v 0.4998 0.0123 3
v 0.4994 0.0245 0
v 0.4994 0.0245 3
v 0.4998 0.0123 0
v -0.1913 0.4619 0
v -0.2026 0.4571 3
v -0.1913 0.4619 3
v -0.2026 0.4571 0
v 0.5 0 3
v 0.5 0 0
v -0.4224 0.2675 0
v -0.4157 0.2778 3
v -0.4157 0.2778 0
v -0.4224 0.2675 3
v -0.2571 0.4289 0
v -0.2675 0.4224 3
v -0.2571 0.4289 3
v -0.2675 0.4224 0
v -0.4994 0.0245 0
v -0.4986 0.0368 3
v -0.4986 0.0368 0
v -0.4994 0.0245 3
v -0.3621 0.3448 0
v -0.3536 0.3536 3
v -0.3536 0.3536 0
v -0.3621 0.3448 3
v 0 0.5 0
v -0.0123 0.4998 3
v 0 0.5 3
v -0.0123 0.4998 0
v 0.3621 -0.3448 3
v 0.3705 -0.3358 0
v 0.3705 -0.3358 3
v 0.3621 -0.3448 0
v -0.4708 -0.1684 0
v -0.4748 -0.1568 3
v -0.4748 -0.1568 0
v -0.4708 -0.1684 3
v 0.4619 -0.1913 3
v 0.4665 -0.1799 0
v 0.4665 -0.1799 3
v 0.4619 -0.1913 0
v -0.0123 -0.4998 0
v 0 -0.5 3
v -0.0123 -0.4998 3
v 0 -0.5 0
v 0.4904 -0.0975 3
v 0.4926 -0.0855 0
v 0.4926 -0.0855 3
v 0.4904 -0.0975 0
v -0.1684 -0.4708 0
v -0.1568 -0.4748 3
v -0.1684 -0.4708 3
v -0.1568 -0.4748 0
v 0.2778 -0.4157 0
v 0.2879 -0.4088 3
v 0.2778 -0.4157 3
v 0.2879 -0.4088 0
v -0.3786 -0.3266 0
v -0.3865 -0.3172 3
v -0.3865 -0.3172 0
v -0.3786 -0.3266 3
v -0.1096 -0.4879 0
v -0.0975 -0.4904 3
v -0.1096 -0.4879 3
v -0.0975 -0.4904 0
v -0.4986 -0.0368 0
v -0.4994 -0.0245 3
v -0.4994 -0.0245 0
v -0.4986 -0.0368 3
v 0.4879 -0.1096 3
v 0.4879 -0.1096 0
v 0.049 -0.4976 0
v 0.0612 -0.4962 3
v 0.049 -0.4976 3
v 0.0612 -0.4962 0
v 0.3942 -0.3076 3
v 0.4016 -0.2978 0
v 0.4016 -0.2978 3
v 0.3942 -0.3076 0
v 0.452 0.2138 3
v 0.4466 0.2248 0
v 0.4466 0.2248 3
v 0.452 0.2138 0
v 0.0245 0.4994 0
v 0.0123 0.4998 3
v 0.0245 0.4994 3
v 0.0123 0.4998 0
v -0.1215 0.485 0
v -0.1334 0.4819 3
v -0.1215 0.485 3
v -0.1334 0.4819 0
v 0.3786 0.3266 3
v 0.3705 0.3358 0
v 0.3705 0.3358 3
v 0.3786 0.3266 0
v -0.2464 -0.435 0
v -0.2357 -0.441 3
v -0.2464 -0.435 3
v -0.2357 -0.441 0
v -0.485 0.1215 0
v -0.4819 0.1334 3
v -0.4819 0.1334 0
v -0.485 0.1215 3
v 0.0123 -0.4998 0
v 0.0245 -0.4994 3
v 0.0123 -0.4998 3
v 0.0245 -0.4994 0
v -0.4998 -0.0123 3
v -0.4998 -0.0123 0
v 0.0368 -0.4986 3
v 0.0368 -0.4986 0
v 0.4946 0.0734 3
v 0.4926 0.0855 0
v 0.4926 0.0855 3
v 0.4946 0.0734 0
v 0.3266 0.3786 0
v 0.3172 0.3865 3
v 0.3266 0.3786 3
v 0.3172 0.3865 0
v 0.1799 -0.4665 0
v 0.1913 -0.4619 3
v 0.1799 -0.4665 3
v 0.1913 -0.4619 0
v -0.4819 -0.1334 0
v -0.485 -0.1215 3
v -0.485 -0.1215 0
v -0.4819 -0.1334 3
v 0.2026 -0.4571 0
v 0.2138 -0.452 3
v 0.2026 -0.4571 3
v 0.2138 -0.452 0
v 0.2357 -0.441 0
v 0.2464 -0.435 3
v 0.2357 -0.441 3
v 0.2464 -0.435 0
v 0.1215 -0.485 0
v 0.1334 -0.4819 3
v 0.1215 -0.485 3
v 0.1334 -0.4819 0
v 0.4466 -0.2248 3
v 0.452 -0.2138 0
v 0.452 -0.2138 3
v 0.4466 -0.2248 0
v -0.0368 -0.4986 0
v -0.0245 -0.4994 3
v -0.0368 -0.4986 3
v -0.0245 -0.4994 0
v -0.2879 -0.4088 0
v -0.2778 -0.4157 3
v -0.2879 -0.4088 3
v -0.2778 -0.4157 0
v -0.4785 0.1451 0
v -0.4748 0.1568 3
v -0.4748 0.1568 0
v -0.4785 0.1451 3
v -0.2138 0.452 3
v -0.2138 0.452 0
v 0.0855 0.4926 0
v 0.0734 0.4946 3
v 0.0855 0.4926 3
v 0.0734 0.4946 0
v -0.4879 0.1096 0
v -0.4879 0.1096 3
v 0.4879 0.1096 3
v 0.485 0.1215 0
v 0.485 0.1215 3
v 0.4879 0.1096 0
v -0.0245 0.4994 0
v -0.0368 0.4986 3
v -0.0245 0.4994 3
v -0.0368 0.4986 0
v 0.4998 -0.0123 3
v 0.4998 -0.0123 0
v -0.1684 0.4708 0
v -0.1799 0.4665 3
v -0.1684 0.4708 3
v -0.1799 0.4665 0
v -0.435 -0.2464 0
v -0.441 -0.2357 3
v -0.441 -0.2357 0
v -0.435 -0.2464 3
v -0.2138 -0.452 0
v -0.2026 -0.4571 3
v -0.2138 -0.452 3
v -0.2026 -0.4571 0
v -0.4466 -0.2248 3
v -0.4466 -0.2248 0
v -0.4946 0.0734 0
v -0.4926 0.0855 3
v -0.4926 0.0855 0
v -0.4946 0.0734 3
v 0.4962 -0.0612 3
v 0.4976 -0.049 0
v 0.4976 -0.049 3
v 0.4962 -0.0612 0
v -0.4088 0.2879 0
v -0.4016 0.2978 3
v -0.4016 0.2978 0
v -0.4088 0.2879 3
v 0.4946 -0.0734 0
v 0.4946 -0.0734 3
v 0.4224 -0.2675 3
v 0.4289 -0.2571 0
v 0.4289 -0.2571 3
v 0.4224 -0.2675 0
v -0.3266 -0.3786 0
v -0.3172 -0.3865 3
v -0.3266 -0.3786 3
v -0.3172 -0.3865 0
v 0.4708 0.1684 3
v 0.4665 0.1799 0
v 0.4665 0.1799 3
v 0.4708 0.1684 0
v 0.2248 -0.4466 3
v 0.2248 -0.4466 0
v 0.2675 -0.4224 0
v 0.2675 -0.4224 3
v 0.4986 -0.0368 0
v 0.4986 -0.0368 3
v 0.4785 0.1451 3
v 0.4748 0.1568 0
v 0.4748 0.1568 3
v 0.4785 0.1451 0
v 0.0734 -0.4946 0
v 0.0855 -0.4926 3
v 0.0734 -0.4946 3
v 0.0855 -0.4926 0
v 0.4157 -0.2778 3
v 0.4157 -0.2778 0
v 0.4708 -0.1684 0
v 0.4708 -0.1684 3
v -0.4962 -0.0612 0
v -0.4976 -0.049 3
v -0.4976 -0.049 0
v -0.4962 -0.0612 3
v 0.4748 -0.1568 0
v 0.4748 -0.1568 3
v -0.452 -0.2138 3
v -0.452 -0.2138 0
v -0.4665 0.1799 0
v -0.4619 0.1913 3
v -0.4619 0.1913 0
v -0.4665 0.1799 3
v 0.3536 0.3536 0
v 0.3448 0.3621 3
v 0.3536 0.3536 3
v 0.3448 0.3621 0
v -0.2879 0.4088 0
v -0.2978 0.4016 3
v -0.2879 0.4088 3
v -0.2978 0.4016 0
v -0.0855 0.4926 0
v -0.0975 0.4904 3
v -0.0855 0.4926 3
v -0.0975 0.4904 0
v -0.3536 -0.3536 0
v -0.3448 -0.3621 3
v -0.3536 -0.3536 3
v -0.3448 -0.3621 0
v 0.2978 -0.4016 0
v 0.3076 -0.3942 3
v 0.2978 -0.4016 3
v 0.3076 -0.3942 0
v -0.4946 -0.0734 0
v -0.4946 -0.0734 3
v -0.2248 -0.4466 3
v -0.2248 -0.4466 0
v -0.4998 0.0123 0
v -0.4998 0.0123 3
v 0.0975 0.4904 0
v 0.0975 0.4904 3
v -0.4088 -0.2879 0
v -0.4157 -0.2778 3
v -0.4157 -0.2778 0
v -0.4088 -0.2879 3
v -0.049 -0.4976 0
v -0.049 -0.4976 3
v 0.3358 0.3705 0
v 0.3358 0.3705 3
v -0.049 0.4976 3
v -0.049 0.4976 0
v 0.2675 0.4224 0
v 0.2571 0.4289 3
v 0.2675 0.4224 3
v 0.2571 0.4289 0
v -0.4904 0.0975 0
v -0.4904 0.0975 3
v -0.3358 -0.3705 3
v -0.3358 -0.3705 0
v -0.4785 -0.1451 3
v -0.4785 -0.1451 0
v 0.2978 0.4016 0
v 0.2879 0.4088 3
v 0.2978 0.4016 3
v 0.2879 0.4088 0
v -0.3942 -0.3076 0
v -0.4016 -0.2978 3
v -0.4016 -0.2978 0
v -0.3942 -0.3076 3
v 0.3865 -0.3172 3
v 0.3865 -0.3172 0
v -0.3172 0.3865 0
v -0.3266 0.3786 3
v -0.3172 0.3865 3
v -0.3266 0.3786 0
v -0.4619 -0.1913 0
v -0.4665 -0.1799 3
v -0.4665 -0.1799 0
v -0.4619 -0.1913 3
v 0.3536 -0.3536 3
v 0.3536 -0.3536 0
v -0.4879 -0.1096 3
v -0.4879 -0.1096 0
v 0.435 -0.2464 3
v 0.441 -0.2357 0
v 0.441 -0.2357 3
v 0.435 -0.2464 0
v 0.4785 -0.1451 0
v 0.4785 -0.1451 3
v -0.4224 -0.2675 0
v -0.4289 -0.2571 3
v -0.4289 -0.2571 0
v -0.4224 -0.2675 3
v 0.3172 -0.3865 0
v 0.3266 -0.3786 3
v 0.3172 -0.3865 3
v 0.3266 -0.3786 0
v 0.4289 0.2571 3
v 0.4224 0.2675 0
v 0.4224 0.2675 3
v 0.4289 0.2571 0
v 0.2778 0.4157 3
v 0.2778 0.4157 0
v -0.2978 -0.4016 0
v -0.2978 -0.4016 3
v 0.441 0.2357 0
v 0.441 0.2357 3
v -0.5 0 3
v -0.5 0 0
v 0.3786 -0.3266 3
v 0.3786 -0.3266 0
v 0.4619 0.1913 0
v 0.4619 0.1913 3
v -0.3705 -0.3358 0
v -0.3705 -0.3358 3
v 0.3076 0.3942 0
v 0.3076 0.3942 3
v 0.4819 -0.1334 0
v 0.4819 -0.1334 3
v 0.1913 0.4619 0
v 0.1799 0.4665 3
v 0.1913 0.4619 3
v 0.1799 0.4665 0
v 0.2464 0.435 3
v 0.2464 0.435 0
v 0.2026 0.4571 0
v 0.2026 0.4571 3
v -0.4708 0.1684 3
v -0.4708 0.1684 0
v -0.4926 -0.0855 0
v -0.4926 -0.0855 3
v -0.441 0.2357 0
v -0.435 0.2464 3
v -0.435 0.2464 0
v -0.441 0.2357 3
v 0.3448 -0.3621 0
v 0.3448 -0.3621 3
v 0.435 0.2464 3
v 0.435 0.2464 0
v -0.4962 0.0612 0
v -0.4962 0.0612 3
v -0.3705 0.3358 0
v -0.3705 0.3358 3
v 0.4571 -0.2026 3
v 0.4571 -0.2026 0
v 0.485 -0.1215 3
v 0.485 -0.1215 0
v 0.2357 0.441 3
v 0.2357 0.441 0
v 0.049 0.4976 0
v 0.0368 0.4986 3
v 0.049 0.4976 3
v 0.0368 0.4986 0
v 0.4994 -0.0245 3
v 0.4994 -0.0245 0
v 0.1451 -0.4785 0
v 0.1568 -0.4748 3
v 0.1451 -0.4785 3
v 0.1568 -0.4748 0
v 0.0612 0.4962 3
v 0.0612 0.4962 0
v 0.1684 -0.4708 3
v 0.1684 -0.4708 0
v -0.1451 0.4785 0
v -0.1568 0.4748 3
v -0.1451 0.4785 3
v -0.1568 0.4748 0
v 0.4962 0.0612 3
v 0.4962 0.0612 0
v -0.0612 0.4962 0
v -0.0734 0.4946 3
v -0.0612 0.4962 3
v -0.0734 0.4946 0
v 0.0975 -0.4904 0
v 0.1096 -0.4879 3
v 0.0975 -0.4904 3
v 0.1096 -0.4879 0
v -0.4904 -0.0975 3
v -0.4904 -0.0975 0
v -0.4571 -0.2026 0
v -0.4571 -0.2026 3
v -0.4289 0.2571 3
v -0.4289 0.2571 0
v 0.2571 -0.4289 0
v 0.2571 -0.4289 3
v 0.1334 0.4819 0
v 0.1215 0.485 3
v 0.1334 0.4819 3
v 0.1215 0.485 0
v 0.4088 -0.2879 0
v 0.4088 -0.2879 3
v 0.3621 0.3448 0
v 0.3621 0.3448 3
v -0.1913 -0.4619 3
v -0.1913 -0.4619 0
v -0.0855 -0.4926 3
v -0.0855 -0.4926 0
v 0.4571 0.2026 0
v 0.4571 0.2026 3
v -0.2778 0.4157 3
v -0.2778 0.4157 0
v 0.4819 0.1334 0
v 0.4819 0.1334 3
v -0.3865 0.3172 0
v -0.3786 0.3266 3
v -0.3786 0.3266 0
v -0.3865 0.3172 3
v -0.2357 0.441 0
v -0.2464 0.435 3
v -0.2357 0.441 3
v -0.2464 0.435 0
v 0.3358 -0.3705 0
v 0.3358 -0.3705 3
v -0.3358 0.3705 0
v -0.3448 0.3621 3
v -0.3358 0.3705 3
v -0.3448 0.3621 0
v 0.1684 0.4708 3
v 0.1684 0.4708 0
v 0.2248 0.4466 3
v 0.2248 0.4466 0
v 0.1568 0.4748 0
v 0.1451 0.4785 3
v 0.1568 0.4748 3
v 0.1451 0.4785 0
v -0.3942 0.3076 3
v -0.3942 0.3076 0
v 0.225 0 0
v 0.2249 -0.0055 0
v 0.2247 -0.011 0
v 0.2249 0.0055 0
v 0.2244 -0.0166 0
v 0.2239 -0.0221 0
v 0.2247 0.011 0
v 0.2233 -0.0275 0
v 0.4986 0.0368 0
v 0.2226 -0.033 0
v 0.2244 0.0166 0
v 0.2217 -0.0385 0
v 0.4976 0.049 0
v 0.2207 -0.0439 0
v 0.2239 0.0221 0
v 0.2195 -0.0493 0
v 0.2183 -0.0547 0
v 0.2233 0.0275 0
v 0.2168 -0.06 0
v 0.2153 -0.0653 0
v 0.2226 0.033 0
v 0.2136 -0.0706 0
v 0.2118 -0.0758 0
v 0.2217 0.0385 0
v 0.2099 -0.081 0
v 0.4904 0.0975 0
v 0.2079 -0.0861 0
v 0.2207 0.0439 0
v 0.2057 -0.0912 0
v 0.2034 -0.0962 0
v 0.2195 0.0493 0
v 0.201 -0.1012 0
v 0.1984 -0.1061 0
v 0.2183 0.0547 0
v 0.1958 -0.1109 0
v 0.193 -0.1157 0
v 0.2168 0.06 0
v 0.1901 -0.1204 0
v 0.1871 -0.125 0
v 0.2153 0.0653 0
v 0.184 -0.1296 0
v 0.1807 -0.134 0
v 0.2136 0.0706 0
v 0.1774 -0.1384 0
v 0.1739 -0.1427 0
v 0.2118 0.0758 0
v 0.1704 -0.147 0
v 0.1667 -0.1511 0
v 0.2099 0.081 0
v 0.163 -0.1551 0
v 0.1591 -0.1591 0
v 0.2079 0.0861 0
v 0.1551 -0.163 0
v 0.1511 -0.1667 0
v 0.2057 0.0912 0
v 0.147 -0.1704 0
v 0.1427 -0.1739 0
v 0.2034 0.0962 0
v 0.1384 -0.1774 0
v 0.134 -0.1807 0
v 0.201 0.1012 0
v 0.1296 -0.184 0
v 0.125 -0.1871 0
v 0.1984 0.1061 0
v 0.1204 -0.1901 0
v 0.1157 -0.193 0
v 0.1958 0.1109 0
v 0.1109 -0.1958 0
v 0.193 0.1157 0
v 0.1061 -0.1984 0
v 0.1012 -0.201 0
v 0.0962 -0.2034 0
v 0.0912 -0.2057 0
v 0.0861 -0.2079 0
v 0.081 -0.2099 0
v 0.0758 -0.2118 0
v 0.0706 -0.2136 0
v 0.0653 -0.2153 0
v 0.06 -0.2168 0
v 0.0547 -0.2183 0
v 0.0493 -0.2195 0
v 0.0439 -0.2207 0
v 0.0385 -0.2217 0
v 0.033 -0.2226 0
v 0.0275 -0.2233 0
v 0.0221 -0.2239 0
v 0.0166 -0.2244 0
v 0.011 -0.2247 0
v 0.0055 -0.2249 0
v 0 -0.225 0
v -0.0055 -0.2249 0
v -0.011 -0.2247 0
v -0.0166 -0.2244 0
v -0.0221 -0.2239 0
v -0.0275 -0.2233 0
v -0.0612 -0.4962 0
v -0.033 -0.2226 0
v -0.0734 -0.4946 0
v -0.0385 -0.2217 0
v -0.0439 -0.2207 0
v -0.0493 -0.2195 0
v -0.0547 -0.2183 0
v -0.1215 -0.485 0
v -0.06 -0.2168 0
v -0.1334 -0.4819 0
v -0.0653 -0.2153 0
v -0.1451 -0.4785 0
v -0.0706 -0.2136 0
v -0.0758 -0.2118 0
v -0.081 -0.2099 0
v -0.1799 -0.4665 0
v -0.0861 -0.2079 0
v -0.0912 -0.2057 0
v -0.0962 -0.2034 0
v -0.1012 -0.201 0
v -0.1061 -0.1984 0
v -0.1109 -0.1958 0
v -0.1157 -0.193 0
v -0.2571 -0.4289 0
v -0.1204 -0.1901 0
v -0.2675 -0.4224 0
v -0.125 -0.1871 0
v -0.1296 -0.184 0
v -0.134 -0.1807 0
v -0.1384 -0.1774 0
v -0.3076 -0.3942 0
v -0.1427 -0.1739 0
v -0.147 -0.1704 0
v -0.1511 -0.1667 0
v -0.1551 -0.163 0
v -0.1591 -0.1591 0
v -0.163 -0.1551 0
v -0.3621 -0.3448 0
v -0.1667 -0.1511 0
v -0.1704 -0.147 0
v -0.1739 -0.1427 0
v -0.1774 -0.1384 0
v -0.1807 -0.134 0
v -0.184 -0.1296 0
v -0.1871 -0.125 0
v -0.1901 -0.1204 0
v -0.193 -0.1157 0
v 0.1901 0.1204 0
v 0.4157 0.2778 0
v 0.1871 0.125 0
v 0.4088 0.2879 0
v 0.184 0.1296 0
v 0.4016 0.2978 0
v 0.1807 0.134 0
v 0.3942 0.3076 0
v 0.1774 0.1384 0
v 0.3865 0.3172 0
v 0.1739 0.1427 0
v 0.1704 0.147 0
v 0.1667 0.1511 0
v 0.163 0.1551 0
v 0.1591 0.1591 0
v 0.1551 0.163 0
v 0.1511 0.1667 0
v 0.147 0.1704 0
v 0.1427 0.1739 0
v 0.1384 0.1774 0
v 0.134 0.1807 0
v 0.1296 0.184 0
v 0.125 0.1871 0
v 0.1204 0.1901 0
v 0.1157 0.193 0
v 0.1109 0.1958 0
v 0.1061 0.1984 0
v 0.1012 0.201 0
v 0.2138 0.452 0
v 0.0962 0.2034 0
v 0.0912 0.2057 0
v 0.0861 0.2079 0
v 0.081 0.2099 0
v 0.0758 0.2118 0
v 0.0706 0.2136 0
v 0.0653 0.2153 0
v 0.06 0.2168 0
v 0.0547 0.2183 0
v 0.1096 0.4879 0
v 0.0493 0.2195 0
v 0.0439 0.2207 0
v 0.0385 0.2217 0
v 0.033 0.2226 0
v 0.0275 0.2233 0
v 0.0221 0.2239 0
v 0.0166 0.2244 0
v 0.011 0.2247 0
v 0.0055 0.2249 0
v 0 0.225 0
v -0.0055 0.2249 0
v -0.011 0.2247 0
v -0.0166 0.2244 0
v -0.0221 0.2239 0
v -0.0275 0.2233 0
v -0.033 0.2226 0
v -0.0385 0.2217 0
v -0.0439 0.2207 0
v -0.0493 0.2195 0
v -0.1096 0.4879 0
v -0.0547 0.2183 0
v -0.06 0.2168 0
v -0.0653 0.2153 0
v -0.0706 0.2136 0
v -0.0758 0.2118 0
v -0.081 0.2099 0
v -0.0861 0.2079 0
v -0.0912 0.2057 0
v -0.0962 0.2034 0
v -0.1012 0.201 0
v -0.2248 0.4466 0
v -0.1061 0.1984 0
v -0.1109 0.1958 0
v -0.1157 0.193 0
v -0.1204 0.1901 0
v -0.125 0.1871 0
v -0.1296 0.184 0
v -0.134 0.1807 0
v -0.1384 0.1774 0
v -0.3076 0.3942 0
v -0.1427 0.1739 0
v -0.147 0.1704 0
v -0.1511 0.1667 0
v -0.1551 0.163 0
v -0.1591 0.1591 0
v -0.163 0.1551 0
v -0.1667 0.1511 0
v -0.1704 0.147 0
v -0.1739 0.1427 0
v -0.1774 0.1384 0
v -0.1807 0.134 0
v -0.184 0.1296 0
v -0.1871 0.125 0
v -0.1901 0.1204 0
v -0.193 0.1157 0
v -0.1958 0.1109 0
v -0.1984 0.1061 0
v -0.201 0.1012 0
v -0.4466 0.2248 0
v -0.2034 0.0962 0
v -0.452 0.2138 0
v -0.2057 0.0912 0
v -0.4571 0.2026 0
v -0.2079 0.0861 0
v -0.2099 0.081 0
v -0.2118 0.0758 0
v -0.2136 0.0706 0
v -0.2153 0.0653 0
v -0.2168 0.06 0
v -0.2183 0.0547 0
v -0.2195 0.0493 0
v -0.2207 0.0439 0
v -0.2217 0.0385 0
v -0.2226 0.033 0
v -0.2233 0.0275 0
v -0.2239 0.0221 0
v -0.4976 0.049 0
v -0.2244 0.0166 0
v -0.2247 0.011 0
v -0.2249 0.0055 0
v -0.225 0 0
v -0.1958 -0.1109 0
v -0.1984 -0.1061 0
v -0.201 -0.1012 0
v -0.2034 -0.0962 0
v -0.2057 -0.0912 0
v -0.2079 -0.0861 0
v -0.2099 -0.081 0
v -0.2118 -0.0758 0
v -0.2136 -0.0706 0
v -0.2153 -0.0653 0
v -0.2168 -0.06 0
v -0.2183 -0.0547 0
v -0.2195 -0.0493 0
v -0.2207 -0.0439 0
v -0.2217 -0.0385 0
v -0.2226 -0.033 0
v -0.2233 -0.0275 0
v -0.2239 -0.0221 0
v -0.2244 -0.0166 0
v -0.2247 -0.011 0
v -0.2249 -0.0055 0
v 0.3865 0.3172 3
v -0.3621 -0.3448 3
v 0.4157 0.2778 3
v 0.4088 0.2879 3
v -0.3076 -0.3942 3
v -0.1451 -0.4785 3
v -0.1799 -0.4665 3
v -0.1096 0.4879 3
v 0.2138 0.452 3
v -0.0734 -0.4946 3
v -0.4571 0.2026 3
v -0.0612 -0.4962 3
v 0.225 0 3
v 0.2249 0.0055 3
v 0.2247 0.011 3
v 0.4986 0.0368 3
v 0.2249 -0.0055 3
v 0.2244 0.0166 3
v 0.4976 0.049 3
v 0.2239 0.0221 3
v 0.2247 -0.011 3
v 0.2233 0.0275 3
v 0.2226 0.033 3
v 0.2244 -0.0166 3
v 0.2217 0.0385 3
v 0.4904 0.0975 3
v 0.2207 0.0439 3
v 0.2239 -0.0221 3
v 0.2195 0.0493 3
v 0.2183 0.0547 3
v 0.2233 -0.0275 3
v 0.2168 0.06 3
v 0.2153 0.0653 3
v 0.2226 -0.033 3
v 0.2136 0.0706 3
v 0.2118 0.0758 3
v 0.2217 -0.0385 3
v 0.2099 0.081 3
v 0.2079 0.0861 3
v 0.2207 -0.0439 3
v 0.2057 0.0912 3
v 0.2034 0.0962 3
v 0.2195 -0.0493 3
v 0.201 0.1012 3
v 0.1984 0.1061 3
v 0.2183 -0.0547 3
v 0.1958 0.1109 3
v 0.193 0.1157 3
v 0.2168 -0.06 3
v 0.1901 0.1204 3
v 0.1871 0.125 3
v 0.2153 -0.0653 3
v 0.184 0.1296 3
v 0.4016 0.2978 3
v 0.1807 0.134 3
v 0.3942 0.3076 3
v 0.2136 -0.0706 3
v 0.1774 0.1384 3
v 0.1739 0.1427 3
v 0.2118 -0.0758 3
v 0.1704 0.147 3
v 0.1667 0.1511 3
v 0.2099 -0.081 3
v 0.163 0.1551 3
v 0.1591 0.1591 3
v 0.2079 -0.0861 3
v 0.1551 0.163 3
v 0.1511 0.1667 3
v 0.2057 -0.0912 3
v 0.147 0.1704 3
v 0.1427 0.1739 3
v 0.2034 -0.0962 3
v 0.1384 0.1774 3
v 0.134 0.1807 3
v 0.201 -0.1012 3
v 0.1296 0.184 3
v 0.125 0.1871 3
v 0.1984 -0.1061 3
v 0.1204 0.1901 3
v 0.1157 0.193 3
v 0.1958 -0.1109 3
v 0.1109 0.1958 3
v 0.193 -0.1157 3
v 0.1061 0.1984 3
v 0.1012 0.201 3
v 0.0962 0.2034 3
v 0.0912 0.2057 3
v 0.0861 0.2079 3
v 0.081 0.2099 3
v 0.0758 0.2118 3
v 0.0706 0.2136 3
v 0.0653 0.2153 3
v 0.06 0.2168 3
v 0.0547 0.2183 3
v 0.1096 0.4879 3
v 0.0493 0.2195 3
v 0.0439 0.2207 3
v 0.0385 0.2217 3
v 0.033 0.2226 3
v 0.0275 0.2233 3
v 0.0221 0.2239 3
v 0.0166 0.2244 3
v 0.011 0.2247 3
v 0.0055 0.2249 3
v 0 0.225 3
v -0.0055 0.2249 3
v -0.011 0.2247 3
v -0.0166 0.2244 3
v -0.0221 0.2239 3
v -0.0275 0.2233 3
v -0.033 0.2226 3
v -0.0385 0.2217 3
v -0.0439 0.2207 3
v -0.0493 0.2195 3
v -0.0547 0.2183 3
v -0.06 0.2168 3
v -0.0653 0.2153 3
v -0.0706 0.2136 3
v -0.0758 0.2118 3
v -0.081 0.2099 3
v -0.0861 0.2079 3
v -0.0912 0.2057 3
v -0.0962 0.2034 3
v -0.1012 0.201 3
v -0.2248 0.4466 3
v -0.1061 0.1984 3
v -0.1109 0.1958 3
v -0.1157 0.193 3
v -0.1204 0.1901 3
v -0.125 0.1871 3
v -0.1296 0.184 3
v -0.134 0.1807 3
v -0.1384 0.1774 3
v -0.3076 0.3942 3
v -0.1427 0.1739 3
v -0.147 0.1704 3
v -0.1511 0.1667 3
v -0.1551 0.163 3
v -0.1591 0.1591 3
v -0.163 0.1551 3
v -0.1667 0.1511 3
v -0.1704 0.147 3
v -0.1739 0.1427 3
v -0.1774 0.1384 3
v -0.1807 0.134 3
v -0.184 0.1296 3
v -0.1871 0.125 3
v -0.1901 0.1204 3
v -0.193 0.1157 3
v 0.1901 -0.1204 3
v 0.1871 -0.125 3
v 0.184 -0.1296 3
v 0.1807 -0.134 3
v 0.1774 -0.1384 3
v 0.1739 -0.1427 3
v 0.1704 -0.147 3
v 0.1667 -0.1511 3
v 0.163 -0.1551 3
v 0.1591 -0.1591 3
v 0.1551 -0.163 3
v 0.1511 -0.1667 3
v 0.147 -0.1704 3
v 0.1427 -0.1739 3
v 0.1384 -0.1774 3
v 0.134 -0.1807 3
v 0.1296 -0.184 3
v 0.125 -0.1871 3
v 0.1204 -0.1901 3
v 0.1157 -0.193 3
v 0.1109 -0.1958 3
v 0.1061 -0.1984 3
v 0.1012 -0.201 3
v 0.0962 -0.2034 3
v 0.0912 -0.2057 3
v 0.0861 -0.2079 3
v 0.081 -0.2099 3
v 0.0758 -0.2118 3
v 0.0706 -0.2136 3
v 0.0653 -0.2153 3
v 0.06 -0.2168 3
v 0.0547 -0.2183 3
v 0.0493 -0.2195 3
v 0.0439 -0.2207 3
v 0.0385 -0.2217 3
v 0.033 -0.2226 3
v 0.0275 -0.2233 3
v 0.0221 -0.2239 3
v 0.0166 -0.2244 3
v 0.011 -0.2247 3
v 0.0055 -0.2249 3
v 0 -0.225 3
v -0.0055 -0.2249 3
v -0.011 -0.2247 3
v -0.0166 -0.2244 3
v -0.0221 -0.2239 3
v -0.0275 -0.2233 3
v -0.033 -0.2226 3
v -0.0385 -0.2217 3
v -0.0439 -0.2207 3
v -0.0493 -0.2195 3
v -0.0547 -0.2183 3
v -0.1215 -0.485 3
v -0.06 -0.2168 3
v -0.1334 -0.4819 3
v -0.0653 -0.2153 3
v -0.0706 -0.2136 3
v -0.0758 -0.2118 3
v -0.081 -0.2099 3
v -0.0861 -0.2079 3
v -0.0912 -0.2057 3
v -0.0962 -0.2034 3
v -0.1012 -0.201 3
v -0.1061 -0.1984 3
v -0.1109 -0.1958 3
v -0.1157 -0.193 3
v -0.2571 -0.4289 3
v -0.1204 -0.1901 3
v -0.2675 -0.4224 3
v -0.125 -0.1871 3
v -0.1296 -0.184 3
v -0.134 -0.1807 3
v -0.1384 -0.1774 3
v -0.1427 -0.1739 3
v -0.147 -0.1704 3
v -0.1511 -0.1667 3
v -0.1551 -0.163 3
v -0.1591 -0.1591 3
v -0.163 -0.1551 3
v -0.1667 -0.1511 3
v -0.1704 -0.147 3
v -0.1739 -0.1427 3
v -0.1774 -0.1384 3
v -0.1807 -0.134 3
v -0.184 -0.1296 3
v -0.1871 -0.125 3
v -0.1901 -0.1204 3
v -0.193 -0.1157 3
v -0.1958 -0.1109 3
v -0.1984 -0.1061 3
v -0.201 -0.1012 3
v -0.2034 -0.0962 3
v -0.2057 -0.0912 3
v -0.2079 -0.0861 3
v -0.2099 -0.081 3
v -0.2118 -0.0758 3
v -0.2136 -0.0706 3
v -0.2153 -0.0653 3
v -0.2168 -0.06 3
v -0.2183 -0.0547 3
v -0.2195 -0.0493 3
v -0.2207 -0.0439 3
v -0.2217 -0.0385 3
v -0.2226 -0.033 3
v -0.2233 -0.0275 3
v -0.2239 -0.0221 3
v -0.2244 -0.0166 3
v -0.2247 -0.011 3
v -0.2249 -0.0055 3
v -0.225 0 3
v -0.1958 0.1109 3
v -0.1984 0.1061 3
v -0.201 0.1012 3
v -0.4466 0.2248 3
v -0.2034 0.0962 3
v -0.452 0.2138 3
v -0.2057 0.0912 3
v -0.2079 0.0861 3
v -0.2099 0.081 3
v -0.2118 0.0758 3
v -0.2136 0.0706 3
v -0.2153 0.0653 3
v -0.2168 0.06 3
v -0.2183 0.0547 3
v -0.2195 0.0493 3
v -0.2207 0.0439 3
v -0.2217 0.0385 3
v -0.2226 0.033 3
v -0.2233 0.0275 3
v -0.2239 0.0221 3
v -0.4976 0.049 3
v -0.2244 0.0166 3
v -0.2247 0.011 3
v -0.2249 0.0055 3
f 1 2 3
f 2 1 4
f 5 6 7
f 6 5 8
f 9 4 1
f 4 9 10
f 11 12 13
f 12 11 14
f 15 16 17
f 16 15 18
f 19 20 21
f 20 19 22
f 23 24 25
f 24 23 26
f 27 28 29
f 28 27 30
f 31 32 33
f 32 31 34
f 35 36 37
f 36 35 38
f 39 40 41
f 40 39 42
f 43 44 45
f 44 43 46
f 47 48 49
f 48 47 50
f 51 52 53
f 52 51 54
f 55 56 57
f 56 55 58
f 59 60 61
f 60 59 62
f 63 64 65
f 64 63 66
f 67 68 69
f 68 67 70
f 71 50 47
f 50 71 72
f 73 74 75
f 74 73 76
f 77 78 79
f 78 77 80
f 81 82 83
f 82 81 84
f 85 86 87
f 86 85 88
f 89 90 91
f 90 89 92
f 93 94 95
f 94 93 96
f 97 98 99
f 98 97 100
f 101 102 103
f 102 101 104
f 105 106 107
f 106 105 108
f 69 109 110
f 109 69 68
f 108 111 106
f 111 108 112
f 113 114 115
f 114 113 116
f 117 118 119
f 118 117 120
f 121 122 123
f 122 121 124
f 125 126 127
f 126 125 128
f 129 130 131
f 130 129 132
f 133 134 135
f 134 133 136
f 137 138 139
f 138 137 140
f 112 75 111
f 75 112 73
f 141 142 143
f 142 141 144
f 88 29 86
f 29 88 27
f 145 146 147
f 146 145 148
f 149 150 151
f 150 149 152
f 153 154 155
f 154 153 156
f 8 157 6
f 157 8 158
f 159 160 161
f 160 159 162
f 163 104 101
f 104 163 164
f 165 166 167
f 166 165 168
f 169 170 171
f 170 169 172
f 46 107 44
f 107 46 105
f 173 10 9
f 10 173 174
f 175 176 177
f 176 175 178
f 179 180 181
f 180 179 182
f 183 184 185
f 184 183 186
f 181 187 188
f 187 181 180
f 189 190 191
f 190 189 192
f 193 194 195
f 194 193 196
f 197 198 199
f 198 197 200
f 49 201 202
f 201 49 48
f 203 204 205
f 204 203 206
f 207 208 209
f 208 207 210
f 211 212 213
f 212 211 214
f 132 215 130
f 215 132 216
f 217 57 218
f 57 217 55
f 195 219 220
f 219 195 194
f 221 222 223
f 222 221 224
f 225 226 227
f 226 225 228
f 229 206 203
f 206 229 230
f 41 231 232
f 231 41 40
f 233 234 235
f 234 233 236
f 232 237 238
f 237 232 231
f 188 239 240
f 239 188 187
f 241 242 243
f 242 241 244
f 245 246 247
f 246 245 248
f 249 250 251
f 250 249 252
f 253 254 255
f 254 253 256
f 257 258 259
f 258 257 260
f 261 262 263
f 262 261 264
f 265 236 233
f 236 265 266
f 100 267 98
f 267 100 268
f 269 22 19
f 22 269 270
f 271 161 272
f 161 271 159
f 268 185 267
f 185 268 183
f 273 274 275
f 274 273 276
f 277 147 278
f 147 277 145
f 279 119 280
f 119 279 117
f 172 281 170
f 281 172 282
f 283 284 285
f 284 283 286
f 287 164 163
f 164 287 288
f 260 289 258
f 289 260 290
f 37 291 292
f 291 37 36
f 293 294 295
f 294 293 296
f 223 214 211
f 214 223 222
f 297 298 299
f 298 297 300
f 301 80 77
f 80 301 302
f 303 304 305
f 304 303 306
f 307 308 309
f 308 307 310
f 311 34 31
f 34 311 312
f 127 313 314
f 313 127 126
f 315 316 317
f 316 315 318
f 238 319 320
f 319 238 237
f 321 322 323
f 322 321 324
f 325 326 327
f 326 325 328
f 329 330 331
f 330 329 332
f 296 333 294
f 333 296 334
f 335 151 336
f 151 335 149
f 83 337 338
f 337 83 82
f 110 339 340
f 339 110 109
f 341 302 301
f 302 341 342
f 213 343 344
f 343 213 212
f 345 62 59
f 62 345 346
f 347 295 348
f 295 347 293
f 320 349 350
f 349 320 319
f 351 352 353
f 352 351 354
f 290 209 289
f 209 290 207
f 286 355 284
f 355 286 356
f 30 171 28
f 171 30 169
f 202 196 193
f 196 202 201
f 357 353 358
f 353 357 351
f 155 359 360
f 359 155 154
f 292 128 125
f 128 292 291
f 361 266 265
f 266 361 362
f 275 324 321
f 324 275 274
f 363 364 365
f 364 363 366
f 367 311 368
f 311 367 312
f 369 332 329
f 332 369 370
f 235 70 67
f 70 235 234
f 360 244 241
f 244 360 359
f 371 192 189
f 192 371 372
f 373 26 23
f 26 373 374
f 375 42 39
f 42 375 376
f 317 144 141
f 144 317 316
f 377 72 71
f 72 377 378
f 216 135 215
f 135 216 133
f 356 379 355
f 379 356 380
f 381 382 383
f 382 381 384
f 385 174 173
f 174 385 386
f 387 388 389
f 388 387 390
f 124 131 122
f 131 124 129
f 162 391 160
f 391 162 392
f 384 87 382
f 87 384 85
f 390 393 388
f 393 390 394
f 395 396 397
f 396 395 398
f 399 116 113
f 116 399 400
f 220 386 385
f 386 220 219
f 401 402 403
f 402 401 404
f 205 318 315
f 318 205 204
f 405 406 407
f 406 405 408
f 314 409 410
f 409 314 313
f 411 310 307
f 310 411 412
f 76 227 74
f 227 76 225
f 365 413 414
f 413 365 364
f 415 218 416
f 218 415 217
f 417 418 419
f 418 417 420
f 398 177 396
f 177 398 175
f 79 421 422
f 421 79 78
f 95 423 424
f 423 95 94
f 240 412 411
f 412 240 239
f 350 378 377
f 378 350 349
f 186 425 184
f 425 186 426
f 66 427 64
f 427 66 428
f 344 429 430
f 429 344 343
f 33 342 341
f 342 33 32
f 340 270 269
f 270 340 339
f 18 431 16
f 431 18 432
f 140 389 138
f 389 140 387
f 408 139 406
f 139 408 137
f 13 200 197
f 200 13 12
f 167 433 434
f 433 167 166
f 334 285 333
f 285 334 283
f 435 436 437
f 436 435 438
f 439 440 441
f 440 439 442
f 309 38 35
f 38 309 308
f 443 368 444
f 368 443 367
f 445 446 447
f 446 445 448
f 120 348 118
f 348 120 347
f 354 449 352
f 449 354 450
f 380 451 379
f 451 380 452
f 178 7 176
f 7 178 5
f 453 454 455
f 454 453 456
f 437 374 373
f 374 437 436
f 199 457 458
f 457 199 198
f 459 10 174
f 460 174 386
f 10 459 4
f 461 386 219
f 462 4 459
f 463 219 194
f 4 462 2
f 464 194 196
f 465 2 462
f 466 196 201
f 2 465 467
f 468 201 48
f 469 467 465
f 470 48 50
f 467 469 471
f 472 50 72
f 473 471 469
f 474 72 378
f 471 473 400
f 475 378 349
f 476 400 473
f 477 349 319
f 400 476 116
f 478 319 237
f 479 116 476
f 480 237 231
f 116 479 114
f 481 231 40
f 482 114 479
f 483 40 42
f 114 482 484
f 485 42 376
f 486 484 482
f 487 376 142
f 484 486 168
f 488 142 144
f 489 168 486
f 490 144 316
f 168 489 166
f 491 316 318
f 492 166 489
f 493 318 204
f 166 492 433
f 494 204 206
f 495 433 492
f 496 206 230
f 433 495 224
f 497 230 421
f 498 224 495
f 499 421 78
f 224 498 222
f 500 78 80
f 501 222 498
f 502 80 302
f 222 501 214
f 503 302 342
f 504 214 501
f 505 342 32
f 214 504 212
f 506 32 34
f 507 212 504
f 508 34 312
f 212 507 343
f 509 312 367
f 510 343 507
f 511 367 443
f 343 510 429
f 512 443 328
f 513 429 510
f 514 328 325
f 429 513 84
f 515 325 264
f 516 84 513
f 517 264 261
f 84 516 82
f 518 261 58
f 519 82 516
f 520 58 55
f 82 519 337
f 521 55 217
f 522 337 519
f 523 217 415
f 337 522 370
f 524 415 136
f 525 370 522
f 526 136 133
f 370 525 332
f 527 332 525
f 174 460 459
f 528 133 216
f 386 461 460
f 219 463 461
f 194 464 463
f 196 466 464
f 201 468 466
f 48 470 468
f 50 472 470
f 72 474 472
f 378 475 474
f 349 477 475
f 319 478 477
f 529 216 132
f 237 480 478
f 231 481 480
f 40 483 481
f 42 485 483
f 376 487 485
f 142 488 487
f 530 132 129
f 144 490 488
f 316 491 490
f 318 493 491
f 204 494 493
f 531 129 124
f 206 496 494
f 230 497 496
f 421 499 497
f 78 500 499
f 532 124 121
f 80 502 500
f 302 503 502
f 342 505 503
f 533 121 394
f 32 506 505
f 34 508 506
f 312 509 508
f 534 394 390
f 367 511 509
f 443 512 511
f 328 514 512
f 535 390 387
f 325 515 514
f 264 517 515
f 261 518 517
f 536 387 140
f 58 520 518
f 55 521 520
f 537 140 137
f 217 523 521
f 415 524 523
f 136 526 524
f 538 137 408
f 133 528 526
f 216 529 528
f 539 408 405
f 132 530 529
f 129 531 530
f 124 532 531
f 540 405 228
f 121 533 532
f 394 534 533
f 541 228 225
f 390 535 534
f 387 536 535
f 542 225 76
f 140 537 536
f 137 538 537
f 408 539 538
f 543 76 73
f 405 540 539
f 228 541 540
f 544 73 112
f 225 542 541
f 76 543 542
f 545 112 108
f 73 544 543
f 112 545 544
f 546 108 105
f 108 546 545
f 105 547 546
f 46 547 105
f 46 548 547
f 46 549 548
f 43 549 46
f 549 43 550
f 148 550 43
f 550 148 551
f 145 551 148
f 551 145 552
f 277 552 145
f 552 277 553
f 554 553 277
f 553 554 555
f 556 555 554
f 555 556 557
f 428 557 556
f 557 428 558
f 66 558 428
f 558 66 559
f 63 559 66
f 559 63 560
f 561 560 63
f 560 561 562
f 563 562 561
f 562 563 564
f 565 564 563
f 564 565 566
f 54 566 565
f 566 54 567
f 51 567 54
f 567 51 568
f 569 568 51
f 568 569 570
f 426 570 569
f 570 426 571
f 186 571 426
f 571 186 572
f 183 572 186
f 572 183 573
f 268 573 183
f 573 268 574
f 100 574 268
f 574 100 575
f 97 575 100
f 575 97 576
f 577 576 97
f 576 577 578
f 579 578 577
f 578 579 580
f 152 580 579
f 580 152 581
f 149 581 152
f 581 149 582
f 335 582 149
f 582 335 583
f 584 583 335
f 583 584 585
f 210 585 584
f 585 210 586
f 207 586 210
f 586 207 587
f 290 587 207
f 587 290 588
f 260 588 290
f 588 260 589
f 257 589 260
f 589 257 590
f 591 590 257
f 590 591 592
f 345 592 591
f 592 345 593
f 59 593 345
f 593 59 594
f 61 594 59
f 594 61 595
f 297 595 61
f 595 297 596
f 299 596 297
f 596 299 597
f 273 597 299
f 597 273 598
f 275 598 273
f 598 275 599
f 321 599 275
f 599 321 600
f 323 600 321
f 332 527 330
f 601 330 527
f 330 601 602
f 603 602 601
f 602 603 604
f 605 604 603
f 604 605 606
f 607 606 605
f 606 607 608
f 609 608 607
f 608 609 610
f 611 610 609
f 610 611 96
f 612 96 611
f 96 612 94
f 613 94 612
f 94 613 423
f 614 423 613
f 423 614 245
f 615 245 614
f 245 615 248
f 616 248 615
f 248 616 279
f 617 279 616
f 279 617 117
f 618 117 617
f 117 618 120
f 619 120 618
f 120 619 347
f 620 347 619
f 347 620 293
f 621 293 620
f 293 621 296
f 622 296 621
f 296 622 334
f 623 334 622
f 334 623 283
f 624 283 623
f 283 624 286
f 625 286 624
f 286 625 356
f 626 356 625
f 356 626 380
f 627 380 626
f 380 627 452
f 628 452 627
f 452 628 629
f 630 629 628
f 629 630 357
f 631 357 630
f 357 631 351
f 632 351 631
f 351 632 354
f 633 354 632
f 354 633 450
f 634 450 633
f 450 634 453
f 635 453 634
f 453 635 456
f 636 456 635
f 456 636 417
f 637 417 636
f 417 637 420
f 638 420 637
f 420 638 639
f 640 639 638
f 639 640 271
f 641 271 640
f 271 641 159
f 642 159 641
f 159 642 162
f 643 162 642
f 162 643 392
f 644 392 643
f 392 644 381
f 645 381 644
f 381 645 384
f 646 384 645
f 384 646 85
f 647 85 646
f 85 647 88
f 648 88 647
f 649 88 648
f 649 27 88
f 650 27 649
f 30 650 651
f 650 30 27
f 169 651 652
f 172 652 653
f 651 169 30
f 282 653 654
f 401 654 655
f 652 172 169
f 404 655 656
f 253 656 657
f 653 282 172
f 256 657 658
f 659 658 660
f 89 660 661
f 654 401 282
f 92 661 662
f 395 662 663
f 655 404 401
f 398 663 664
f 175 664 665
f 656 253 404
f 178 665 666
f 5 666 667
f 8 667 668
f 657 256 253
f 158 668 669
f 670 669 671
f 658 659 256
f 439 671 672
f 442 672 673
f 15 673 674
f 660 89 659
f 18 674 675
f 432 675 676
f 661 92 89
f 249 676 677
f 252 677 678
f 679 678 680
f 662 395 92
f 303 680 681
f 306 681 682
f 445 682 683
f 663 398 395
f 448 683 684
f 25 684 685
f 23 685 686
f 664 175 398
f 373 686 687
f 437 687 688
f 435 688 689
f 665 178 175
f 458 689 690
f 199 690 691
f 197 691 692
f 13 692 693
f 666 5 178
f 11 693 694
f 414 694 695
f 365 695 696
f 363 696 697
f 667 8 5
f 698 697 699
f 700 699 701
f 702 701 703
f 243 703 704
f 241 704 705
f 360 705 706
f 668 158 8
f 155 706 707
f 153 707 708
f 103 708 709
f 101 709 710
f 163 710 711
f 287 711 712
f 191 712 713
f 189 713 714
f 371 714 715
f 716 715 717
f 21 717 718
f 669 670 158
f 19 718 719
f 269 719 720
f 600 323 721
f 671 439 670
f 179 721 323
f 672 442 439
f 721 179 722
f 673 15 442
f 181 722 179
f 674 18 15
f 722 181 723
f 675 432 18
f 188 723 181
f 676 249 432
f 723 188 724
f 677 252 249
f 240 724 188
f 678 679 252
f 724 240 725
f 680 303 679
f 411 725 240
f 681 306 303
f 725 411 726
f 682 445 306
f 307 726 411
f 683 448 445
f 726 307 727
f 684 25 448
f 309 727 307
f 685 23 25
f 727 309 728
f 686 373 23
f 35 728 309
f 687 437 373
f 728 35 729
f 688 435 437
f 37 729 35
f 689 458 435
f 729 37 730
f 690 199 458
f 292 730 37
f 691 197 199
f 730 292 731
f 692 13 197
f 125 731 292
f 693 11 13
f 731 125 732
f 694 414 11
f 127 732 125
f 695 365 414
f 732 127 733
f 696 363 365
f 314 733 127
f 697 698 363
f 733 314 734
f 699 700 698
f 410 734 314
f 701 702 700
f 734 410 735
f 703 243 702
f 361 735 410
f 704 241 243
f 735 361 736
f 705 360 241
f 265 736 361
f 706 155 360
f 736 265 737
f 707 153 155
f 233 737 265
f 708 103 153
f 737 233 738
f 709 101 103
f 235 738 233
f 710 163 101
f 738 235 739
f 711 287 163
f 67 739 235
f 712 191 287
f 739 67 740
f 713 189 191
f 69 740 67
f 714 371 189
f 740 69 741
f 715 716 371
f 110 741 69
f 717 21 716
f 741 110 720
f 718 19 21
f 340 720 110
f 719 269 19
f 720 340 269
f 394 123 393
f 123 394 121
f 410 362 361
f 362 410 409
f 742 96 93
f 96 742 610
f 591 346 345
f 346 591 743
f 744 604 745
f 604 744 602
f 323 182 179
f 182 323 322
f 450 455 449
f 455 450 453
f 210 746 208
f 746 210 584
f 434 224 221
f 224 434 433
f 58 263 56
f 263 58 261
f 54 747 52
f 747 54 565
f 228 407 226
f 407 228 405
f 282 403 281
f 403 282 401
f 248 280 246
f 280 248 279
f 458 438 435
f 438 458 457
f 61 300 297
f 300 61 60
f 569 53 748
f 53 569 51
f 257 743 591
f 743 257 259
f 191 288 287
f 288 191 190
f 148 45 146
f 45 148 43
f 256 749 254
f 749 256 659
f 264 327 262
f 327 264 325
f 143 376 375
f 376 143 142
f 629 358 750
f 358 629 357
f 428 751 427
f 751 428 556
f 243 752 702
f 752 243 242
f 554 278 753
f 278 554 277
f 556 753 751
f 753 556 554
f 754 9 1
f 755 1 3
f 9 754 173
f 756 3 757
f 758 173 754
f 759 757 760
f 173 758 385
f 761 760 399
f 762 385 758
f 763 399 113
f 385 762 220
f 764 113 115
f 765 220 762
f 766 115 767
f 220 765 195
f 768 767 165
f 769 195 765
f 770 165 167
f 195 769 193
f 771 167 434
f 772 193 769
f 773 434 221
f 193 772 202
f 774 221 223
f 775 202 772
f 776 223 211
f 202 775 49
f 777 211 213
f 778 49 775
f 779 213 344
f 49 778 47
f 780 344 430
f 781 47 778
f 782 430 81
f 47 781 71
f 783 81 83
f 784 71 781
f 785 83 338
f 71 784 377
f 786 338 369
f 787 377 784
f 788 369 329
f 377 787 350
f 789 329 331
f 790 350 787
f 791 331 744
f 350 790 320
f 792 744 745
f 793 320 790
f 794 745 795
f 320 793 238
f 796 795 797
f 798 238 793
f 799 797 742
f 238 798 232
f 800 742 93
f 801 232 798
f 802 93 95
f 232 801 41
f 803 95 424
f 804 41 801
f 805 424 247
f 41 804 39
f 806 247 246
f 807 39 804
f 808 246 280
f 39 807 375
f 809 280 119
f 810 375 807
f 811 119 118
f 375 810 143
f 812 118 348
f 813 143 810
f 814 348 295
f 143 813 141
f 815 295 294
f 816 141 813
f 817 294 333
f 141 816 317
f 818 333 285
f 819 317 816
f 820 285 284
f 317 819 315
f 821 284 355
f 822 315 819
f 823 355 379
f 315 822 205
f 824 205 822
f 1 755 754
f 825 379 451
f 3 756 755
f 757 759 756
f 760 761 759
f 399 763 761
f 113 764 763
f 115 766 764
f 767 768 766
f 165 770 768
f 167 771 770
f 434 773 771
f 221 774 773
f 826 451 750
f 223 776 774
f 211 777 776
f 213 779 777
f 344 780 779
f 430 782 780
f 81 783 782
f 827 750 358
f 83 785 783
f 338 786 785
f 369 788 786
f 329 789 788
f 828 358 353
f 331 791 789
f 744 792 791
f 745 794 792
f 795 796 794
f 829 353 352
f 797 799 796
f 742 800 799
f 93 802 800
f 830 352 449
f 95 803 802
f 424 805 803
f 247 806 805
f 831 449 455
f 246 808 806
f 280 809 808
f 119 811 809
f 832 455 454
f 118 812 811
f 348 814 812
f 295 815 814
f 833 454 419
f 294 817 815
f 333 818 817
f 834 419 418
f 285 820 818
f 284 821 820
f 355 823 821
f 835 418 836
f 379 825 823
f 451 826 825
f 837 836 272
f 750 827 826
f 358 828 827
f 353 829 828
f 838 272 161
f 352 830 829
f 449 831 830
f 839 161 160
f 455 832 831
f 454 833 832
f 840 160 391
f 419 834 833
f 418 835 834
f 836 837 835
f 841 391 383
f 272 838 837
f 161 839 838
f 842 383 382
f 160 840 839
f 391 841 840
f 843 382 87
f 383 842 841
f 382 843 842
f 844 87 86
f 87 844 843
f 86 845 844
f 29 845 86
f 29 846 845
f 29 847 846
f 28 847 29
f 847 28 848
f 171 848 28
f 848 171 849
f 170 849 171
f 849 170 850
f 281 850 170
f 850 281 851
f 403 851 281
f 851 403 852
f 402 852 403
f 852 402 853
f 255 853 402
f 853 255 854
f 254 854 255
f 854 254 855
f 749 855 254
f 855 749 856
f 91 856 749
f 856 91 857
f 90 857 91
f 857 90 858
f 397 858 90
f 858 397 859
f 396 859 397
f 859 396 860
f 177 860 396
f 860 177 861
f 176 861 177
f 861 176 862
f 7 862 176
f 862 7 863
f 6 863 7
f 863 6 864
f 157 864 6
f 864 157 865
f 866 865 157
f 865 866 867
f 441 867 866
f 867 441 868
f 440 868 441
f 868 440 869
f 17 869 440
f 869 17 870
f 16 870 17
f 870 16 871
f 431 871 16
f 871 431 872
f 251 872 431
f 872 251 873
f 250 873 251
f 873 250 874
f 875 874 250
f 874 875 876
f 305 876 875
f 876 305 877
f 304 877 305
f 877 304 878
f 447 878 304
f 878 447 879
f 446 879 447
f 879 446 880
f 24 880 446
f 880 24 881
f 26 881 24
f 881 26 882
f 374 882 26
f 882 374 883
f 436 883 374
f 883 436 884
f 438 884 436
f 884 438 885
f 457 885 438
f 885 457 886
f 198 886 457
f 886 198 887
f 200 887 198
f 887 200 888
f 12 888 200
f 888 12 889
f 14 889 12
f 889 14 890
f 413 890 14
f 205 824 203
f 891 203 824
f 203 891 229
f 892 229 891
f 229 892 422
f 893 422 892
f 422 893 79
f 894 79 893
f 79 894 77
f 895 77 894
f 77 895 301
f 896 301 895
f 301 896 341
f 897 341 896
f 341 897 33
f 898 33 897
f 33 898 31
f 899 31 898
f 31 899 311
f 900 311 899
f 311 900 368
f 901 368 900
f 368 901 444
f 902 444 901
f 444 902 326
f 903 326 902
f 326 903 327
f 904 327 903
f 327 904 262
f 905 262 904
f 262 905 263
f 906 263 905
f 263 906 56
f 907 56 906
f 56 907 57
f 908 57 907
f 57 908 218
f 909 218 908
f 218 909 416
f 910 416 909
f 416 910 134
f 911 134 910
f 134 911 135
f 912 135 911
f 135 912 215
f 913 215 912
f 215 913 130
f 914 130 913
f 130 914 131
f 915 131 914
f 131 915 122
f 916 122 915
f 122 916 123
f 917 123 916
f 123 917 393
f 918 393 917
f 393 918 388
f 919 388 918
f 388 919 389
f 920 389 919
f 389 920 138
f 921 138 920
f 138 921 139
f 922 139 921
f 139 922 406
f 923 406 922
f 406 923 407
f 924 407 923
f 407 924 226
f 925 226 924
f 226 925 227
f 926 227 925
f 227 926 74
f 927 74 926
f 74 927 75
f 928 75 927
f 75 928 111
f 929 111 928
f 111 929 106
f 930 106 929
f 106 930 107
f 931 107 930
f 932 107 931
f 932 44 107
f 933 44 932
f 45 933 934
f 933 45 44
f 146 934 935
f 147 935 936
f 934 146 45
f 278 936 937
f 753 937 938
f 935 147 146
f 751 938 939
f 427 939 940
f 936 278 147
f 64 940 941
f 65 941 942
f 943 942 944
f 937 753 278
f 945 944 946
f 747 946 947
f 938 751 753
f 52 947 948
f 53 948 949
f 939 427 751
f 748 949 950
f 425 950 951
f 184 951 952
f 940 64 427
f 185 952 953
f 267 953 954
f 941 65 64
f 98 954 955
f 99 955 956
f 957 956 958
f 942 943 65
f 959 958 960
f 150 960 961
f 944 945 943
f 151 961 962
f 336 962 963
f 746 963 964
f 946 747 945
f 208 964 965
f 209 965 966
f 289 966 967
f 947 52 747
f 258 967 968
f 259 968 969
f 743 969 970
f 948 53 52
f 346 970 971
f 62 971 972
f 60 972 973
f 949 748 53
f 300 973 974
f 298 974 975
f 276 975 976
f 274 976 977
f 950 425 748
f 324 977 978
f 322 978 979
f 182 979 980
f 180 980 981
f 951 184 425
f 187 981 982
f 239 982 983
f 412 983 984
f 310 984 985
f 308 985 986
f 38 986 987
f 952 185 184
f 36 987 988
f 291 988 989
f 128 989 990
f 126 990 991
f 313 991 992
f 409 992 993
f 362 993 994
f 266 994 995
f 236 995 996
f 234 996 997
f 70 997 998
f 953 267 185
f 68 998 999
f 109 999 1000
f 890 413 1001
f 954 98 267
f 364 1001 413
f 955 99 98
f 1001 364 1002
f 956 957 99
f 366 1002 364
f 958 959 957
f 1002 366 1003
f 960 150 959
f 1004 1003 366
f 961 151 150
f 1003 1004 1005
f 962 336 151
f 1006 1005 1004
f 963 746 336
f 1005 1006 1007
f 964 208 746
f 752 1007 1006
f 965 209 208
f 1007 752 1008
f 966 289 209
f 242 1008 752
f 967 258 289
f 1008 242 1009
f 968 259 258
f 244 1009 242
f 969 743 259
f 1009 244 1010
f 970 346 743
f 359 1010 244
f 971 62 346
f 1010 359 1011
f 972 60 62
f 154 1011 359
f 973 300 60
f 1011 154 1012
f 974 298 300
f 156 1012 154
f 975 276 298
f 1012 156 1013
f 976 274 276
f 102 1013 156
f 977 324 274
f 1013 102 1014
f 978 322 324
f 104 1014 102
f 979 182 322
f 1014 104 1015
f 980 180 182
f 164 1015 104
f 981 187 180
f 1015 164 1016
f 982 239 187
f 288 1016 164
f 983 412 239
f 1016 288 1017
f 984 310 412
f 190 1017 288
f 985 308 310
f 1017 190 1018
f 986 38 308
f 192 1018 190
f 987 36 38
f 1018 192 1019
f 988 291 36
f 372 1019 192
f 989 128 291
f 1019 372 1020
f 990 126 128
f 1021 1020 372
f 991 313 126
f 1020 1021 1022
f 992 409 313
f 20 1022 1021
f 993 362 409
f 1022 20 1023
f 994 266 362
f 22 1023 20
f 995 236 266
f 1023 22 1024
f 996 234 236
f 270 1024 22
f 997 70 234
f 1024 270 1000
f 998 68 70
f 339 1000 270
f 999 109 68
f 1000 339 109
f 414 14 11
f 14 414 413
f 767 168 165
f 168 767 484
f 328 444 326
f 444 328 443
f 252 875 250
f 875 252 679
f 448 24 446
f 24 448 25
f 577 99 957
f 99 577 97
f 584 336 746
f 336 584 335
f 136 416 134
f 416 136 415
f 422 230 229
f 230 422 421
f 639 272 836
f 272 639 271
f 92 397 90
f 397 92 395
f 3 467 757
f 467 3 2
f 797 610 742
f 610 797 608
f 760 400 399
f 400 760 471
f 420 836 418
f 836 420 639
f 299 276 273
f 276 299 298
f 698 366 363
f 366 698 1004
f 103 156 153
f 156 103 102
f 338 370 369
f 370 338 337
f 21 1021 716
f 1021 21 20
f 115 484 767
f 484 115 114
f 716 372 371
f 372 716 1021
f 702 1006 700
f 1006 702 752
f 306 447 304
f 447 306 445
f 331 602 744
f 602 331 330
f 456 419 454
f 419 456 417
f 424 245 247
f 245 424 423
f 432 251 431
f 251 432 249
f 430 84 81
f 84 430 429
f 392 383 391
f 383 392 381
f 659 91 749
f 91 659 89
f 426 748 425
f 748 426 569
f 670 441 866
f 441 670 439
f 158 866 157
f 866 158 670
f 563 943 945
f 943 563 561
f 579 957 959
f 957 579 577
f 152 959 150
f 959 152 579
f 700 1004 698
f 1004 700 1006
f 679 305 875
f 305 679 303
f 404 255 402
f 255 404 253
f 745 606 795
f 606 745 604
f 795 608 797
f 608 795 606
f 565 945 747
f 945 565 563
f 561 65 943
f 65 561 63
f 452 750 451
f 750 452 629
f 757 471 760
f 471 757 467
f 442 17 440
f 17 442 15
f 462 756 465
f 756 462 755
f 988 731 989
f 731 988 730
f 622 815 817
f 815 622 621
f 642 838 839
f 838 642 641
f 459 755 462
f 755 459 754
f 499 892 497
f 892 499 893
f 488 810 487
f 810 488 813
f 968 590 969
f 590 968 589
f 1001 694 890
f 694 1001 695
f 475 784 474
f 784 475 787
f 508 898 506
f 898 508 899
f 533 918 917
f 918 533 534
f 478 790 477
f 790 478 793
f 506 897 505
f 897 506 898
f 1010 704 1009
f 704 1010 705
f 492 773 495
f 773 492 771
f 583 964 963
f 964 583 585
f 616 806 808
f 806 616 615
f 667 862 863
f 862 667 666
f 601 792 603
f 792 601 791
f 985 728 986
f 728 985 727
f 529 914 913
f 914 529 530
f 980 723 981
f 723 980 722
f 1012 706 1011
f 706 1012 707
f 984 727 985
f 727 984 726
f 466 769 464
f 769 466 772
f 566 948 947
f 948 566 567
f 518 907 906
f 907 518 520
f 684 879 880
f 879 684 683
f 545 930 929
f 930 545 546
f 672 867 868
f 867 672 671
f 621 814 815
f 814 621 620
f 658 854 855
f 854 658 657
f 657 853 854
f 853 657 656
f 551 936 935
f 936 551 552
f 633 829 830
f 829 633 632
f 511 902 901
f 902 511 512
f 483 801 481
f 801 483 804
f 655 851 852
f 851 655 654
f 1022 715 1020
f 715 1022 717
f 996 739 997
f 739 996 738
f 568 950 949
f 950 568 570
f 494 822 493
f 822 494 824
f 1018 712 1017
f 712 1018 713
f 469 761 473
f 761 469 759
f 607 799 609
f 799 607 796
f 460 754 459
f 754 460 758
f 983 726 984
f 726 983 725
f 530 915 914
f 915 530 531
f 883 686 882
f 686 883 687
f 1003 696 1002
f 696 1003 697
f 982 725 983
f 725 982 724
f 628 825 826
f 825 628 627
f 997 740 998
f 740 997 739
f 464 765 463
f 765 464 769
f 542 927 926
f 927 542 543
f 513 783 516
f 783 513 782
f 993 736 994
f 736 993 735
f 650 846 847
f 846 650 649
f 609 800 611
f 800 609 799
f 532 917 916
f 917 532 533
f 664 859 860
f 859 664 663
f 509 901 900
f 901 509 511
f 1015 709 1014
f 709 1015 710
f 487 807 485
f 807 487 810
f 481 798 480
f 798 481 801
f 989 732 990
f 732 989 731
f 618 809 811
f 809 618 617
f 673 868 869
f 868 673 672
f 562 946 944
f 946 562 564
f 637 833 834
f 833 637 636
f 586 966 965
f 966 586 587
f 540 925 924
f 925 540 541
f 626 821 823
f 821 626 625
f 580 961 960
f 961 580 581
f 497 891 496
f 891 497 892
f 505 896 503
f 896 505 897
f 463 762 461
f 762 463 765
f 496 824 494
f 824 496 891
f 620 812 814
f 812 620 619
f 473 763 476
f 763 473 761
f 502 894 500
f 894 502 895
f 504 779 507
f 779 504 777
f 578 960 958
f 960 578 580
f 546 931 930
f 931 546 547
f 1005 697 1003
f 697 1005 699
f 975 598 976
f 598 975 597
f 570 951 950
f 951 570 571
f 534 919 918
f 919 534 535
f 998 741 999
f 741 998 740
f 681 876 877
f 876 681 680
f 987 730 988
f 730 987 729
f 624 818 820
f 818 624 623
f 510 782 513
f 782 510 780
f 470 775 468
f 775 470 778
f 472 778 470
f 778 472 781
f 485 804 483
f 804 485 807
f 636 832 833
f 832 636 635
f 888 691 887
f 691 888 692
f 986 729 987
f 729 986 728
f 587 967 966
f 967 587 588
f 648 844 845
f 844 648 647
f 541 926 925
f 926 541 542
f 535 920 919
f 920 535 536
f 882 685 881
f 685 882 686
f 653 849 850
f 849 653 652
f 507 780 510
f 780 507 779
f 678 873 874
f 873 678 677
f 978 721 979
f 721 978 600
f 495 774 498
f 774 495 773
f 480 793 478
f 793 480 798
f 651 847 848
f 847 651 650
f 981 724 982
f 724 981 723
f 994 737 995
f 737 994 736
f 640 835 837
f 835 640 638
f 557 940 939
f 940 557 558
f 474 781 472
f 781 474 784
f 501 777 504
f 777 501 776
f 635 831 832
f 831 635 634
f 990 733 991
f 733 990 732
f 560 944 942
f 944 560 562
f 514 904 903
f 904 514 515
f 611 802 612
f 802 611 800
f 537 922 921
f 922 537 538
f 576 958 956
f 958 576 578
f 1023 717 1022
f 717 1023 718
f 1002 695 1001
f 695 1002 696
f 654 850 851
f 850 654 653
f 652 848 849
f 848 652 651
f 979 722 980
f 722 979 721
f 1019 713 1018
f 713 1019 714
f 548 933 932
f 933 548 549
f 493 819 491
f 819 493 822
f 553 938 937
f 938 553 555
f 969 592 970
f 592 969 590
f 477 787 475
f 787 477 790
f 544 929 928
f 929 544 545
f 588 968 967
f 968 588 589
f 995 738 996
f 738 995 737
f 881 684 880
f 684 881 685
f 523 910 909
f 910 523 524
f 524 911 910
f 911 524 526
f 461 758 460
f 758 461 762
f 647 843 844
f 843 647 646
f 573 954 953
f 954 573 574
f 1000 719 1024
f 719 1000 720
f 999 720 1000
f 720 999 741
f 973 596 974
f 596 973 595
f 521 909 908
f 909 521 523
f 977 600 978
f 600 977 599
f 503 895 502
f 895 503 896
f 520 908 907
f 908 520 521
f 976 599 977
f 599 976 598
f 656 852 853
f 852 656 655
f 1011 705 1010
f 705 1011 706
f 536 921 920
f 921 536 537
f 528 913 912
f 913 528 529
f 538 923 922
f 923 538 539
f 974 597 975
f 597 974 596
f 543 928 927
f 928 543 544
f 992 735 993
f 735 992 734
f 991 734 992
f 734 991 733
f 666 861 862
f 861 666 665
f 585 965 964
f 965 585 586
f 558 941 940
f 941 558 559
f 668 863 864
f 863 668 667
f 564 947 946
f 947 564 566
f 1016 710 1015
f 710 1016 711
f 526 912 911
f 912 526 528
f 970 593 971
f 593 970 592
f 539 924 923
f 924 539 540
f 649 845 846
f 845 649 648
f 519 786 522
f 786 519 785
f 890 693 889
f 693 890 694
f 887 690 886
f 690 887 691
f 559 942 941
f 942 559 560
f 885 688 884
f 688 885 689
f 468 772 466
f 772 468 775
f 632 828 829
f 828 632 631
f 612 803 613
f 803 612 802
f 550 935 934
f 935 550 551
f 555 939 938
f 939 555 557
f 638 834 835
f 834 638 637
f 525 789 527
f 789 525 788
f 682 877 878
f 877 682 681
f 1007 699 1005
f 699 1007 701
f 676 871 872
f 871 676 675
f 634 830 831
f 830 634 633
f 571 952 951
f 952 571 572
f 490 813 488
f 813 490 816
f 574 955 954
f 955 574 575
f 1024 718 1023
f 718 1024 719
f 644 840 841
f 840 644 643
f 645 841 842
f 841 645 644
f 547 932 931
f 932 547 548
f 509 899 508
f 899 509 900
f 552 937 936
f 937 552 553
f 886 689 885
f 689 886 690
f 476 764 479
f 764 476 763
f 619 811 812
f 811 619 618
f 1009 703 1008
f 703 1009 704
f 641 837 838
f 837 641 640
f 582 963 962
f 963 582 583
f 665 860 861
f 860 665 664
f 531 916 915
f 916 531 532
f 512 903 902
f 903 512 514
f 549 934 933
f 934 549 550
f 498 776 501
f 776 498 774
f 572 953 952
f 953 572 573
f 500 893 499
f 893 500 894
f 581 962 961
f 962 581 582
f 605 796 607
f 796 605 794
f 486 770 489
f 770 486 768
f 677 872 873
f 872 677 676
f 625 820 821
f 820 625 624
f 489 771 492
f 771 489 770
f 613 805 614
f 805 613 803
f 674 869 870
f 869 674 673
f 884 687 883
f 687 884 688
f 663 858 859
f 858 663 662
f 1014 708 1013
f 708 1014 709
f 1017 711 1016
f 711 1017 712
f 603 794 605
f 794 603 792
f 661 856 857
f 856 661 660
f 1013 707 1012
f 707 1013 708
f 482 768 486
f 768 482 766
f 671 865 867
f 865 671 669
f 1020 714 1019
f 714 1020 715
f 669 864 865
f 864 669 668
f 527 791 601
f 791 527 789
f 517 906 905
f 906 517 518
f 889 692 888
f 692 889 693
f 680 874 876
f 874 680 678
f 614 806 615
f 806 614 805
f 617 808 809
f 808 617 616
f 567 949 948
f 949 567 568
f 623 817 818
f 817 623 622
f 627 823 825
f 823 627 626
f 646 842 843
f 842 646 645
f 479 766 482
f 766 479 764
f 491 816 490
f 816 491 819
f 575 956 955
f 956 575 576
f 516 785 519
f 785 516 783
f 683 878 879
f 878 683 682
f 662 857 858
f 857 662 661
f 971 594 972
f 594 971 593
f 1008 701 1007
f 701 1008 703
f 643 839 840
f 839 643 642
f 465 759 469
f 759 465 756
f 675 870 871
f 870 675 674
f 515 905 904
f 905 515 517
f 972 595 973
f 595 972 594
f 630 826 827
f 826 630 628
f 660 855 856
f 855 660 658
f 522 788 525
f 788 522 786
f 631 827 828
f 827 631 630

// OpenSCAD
// Tube (Thick) for Stacks of Shapes
// by Slashee the Cow
$fn = 256;

color("GreenYellow")
difference(){
    linear_extrude(3)
        circle(d=1);
    linear_extrude(4)
        circle(d=0.45);
}
